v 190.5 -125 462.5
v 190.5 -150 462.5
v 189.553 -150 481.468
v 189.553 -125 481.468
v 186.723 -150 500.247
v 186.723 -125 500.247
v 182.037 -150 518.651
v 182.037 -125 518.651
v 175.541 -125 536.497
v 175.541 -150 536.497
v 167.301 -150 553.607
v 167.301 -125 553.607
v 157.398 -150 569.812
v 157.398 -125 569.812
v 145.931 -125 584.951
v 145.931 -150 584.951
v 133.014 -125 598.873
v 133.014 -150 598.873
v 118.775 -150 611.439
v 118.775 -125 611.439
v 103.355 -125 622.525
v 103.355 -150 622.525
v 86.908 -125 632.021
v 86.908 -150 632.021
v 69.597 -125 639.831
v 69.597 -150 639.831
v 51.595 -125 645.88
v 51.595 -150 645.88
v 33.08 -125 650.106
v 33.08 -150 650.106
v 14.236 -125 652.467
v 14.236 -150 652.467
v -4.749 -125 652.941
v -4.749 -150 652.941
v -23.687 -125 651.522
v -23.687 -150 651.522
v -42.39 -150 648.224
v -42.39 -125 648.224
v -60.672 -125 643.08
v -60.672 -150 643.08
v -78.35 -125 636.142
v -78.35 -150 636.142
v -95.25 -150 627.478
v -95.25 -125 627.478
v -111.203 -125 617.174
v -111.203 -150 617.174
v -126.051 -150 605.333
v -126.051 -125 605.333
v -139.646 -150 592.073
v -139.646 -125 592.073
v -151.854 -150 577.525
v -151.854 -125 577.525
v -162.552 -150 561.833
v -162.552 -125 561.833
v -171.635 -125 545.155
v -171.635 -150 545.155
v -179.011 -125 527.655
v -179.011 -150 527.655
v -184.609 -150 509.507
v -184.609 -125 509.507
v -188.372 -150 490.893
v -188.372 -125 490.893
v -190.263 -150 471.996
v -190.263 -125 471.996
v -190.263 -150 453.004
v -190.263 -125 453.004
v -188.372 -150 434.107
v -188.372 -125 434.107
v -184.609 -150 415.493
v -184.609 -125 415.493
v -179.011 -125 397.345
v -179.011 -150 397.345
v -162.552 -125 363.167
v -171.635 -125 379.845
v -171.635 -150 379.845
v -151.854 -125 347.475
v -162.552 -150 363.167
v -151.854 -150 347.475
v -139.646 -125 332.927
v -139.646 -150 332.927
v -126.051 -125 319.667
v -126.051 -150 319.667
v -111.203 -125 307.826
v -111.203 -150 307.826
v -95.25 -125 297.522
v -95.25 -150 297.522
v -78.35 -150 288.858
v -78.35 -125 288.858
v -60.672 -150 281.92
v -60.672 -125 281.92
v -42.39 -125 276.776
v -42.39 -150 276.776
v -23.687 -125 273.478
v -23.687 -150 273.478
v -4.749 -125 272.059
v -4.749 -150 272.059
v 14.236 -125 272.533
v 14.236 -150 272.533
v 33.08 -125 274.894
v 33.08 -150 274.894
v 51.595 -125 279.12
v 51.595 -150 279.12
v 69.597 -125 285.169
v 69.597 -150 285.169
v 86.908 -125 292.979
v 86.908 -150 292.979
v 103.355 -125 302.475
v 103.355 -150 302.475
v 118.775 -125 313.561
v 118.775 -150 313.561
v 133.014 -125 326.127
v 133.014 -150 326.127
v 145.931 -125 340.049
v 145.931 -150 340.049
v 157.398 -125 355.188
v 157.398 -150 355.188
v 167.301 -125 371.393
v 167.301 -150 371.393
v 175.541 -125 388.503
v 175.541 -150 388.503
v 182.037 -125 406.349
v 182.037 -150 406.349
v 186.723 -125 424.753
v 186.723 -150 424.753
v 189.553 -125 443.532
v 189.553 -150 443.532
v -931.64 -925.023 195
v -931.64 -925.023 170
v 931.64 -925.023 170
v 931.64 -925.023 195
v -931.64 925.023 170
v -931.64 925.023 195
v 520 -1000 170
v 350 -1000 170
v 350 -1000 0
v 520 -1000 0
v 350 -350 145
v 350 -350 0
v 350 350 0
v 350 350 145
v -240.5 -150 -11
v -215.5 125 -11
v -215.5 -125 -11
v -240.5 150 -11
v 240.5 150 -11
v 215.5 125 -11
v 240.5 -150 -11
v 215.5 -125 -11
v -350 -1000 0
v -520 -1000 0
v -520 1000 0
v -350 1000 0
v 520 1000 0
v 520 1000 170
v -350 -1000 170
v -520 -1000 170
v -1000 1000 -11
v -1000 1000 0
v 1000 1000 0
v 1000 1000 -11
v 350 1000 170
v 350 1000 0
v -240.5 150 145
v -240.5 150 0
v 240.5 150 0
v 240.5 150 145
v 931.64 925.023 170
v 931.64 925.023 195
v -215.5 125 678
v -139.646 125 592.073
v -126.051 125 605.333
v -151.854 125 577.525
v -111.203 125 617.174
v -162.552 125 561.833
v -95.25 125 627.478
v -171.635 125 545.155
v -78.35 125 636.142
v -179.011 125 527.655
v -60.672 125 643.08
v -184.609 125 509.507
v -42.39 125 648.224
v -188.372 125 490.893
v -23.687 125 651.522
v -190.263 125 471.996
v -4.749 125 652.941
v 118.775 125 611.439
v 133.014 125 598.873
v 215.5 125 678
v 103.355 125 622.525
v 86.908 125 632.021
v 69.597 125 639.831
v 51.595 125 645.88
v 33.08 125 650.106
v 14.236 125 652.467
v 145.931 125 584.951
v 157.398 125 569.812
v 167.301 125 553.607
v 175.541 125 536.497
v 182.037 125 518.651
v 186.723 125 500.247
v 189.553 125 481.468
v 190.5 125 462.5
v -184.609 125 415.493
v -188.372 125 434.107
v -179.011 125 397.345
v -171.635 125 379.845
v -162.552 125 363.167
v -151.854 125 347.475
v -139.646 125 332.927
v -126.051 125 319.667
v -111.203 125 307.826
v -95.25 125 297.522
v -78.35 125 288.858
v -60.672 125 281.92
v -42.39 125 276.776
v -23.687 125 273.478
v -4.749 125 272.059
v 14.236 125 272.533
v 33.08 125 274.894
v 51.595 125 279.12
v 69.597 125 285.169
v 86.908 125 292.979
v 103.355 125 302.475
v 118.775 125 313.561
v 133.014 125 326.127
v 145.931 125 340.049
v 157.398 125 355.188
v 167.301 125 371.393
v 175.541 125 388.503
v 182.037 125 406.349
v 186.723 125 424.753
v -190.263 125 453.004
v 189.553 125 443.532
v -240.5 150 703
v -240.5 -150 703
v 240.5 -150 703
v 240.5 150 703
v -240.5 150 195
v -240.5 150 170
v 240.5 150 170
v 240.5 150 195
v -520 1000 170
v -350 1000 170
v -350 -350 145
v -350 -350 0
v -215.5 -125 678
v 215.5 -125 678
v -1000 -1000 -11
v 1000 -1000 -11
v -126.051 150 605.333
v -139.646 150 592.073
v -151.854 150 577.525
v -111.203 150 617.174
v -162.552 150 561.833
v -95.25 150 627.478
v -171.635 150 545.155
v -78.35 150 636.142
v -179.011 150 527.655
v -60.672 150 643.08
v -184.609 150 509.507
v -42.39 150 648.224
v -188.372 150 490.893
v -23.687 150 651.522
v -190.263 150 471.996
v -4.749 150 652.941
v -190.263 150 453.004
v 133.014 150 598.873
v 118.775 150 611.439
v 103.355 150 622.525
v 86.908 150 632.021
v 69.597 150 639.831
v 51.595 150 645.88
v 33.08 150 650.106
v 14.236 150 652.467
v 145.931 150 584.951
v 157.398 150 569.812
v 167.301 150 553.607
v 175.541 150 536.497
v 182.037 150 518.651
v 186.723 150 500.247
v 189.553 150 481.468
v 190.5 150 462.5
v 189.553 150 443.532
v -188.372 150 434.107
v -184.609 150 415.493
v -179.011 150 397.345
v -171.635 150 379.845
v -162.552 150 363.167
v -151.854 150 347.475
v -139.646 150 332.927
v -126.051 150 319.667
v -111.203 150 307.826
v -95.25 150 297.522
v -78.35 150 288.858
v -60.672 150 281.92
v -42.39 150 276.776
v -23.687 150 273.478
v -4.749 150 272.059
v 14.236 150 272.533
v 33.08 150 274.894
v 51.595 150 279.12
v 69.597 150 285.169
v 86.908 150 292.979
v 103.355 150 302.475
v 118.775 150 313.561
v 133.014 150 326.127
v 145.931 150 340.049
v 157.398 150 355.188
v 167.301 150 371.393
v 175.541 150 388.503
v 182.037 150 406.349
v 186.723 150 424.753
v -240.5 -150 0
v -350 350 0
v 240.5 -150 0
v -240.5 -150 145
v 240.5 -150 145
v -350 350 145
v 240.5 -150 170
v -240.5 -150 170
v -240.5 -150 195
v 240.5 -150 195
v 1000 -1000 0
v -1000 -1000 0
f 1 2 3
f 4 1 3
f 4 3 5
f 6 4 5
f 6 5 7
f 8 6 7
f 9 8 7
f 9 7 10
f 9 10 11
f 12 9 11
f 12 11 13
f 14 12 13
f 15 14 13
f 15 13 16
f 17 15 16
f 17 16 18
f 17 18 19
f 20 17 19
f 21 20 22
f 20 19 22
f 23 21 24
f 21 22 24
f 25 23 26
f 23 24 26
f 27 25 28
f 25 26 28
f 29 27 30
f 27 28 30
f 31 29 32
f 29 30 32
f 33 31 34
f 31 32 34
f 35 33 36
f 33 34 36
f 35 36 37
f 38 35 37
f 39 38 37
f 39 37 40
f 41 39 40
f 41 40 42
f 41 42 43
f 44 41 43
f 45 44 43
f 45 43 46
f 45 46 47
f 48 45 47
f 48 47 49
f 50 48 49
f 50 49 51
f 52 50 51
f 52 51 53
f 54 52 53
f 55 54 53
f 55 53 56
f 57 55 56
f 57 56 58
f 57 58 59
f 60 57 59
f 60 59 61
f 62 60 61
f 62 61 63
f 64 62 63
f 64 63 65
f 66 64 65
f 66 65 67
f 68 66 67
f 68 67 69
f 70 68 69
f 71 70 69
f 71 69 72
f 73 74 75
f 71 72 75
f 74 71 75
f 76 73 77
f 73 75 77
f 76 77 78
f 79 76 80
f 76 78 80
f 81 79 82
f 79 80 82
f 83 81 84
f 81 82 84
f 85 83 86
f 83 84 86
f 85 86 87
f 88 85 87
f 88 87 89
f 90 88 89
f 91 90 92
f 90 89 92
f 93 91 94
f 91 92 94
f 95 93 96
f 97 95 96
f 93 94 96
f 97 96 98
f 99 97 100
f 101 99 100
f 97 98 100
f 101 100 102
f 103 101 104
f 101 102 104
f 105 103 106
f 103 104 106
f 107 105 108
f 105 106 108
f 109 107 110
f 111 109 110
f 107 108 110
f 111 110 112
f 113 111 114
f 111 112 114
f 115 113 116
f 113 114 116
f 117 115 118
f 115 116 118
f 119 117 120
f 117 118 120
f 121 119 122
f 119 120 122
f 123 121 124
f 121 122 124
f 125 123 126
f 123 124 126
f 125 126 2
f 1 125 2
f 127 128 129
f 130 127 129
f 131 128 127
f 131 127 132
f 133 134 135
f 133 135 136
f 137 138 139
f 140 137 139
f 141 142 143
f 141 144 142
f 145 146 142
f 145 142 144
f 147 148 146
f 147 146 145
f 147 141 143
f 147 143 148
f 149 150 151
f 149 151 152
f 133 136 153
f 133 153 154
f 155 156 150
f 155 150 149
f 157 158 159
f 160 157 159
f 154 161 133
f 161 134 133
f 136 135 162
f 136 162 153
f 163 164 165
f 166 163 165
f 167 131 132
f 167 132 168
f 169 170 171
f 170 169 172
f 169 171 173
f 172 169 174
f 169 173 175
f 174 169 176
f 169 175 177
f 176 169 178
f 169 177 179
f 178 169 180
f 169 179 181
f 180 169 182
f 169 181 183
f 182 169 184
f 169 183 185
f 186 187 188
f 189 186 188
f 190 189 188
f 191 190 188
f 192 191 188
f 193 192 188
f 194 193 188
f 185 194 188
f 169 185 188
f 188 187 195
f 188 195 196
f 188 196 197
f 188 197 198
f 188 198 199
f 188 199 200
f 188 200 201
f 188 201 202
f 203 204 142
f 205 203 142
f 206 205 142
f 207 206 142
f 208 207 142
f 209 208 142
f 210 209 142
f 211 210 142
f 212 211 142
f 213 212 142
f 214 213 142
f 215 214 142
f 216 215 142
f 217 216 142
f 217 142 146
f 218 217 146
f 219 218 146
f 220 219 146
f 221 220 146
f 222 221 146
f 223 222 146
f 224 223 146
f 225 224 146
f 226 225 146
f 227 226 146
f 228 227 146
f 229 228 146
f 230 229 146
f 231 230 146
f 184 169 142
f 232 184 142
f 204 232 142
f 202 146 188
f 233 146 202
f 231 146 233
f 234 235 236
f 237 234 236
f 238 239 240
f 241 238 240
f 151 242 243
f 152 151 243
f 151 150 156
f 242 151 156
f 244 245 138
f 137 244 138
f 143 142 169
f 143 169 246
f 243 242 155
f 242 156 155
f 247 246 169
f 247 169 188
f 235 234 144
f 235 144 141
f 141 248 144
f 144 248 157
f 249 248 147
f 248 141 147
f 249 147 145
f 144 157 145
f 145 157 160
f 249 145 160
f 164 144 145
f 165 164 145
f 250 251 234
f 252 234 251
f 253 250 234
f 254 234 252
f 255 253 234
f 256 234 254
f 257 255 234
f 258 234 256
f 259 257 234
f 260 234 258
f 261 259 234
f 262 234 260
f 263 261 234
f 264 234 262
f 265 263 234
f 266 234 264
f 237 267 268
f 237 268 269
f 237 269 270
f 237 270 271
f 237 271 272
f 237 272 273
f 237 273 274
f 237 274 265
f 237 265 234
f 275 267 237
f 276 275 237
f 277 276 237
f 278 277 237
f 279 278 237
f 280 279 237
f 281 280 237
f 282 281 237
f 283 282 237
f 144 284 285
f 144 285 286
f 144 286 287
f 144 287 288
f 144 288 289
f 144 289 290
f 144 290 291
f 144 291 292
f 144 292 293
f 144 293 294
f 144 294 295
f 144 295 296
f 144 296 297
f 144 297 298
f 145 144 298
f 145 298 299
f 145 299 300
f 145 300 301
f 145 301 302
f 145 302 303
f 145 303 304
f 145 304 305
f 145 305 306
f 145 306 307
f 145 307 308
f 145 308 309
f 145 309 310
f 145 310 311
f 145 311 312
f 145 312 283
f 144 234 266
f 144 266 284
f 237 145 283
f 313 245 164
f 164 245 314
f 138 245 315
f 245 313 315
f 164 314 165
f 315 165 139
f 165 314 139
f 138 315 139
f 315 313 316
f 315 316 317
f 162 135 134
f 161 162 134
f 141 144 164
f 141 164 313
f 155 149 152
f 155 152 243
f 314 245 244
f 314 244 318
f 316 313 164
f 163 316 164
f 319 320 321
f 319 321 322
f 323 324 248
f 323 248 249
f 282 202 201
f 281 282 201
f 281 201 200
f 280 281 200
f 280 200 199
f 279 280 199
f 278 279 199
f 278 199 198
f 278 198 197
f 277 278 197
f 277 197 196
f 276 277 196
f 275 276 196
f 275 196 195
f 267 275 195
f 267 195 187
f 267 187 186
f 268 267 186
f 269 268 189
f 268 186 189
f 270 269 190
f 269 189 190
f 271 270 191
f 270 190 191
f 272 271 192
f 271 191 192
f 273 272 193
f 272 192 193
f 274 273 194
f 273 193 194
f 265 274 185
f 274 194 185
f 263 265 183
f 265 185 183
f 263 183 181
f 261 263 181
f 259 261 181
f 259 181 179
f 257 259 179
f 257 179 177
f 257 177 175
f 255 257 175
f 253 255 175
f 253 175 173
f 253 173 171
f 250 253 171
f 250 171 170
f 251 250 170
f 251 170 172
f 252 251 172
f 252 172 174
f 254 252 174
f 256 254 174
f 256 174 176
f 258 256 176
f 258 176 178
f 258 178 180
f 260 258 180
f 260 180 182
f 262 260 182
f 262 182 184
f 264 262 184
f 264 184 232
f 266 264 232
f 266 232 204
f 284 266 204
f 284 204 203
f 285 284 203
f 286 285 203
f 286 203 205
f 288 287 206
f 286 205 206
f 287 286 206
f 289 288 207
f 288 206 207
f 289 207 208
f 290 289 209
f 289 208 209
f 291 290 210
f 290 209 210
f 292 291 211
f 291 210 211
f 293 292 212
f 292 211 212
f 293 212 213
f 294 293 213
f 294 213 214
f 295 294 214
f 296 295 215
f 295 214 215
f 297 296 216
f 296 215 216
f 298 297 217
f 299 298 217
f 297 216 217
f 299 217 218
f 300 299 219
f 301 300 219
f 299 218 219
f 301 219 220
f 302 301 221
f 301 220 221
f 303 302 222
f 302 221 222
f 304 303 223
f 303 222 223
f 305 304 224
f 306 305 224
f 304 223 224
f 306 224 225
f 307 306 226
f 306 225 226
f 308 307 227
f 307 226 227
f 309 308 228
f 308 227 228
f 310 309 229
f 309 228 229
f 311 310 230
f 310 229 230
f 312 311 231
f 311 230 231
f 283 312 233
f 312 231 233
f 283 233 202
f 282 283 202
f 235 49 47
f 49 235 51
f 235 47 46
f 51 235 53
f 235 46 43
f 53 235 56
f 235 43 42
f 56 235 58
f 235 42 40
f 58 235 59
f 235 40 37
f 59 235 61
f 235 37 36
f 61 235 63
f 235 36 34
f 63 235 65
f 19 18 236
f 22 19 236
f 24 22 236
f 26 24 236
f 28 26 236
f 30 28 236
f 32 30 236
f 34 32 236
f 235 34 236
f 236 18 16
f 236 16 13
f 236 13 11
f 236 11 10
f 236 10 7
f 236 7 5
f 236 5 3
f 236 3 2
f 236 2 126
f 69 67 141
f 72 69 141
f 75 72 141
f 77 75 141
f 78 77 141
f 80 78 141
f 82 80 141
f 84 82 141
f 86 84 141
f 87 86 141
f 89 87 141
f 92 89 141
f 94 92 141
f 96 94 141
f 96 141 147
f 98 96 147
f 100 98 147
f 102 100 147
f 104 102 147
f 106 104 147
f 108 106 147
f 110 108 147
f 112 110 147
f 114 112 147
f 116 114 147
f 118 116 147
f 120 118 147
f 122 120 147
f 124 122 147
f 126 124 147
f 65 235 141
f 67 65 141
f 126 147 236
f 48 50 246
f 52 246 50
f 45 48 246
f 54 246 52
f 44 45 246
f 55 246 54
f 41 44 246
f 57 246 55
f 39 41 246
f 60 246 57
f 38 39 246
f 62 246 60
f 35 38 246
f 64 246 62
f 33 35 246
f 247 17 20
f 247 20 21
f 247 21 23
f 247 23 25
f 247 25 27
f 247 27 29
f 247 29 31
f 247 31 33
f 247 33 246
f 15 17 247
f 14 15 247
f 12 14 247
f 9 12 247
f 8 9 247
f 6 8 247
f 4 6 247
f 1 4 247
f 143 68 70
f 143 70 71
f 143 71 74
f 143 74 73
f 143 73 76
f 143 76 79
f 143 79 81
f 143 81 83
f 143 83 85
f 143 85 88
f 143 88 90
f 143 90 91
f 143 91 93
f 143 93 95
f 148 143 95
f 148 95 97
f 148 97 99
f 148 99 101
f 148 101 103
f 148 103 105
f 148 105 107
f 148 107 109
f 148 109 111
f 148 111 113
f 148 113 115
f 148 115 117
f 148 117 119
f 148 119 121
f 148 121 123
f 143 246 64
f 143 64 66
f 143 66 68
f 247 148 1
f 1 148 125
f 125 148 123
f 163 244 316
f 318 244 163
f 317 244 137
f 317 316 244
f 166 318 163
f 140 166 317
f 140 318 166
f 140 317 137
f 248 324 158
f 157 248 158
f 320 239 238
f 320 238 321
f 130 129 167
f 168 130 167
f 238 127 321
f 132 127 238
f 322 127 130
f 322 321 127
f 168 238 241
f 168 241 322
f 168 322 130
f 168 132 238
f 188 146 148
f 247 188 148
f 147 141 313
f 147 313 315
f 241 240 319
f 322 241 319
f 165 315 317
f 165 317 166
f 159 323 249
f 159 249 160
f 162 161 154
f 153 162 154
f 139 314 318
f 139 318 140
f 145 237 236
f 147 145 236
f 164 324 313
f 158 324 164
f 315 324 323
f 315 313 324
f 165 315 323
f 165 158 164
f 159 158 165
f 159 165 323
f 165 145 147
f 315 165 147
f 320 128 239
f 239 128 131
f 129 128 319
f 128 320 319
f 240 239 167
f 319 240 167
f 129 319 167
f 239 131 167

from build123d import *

# Parameters (mm, degrees)
F0_W      = 170
F0_H      = 170
F1_DEPTH  = 1000
F2_W      = 2000
F2_H      = 2000
F3_DEPTH  = 11
F4_W      = 481
F4_H      = 300
F5_DEPTH  = 714
F6_W      = 1863.2805347443
F6_H      = 1850.0454425812
F7_DEPTH  = 25
F9_T      = -25
F10_R     = 190.5
F11_DEPTH = 1150.001
F12_W     = 700
F12_H     = 700
F12_W_2   = 481
F12_H_2   = 300
F13_DEPTH = 145


with BuildPart() as f1:
    # F0 (on Front) → F1 (new body, symmetric)
    with BuildSketch(Plane.XZ):
        with Locations((-435, 85)):
            Rectangle(F0_W, F0_H)
    extrude(amount=F1_DEPTH, both=True)


with BuildPart() as f1b:
    # F0 (on Front) → F1, piece 2 (new body, symmetric)
    with BuildSketch(Plane.XZ):
        with Locations((435, 85)):
            Rectangle(F0_W, F0_H)
    extrude(amount=F1_DEPTH, both=True)


with BuildPart() as f3:
    # F2 (on Top) → F3 (new body)
    with BuildSketch(Plane.XY):
        Rectangle(F2_W, F2_H)
    extrude(amount=-F3_DEPTH)


with BuildPart() as f5:
    # F4 (on face) → F5 (new body)
    with BuildSketch(Plane(origin=(0, 0, -11), x_dir=(1, 0, 0), z_dir=(0, 0, -1))):
        Rectangle(F4_W, F4_H)
    extrude(amount=-F5_DEPTH)


with BuildPart() as f7:
    # F6 (on face) → F7 (new body)
    with BuildSketch(Plane.XY.offset(170)):
        Rectangle(F6_W, F6_H)
    extrude(amount=F7_DEPTH)

    # F8: cut F5
    add(f5.part, mode=Mode.SUBTRACT)


with BuildPart() as f3_1:
    add(f3.part)

    # F8: cut F5
    add(f5.part, mode=Mode.SUBTRACT)


with BuildPart() as f5_1:
    add(f5.part)

    # F9
    f9_openings = [f5_1.faces().sort_by_distance(p)[0] for p in [
        (0, 0, -11),
    ]]
    offset(amount=F9_T, openings=f9_openings)

    # F10 (on face) → F11 (cut, through all)
    with BuildSketch(Plane.XZ.offset(150)):
        with Locations((0, 462.5)):
            Circle(F10_R)
    extrude(amount=-F11_DEPTH, mode=Mode.SUBTRACT)


with BuildPart() as f13:
    # F12 (on face) → F13 (new body)
    with BuildSketch(Plane.XY):
        Rectangle(F12_W, F12_H)
        Rectangle(F12_W_2, F12_H_2, mode=Mode.SUBTRACT)
    extrude(amount=F13_DEPTH)


solid = Compound([f1.part, f1b.part, f7.part, f3_1.part, f5_1.part, f13.part])
